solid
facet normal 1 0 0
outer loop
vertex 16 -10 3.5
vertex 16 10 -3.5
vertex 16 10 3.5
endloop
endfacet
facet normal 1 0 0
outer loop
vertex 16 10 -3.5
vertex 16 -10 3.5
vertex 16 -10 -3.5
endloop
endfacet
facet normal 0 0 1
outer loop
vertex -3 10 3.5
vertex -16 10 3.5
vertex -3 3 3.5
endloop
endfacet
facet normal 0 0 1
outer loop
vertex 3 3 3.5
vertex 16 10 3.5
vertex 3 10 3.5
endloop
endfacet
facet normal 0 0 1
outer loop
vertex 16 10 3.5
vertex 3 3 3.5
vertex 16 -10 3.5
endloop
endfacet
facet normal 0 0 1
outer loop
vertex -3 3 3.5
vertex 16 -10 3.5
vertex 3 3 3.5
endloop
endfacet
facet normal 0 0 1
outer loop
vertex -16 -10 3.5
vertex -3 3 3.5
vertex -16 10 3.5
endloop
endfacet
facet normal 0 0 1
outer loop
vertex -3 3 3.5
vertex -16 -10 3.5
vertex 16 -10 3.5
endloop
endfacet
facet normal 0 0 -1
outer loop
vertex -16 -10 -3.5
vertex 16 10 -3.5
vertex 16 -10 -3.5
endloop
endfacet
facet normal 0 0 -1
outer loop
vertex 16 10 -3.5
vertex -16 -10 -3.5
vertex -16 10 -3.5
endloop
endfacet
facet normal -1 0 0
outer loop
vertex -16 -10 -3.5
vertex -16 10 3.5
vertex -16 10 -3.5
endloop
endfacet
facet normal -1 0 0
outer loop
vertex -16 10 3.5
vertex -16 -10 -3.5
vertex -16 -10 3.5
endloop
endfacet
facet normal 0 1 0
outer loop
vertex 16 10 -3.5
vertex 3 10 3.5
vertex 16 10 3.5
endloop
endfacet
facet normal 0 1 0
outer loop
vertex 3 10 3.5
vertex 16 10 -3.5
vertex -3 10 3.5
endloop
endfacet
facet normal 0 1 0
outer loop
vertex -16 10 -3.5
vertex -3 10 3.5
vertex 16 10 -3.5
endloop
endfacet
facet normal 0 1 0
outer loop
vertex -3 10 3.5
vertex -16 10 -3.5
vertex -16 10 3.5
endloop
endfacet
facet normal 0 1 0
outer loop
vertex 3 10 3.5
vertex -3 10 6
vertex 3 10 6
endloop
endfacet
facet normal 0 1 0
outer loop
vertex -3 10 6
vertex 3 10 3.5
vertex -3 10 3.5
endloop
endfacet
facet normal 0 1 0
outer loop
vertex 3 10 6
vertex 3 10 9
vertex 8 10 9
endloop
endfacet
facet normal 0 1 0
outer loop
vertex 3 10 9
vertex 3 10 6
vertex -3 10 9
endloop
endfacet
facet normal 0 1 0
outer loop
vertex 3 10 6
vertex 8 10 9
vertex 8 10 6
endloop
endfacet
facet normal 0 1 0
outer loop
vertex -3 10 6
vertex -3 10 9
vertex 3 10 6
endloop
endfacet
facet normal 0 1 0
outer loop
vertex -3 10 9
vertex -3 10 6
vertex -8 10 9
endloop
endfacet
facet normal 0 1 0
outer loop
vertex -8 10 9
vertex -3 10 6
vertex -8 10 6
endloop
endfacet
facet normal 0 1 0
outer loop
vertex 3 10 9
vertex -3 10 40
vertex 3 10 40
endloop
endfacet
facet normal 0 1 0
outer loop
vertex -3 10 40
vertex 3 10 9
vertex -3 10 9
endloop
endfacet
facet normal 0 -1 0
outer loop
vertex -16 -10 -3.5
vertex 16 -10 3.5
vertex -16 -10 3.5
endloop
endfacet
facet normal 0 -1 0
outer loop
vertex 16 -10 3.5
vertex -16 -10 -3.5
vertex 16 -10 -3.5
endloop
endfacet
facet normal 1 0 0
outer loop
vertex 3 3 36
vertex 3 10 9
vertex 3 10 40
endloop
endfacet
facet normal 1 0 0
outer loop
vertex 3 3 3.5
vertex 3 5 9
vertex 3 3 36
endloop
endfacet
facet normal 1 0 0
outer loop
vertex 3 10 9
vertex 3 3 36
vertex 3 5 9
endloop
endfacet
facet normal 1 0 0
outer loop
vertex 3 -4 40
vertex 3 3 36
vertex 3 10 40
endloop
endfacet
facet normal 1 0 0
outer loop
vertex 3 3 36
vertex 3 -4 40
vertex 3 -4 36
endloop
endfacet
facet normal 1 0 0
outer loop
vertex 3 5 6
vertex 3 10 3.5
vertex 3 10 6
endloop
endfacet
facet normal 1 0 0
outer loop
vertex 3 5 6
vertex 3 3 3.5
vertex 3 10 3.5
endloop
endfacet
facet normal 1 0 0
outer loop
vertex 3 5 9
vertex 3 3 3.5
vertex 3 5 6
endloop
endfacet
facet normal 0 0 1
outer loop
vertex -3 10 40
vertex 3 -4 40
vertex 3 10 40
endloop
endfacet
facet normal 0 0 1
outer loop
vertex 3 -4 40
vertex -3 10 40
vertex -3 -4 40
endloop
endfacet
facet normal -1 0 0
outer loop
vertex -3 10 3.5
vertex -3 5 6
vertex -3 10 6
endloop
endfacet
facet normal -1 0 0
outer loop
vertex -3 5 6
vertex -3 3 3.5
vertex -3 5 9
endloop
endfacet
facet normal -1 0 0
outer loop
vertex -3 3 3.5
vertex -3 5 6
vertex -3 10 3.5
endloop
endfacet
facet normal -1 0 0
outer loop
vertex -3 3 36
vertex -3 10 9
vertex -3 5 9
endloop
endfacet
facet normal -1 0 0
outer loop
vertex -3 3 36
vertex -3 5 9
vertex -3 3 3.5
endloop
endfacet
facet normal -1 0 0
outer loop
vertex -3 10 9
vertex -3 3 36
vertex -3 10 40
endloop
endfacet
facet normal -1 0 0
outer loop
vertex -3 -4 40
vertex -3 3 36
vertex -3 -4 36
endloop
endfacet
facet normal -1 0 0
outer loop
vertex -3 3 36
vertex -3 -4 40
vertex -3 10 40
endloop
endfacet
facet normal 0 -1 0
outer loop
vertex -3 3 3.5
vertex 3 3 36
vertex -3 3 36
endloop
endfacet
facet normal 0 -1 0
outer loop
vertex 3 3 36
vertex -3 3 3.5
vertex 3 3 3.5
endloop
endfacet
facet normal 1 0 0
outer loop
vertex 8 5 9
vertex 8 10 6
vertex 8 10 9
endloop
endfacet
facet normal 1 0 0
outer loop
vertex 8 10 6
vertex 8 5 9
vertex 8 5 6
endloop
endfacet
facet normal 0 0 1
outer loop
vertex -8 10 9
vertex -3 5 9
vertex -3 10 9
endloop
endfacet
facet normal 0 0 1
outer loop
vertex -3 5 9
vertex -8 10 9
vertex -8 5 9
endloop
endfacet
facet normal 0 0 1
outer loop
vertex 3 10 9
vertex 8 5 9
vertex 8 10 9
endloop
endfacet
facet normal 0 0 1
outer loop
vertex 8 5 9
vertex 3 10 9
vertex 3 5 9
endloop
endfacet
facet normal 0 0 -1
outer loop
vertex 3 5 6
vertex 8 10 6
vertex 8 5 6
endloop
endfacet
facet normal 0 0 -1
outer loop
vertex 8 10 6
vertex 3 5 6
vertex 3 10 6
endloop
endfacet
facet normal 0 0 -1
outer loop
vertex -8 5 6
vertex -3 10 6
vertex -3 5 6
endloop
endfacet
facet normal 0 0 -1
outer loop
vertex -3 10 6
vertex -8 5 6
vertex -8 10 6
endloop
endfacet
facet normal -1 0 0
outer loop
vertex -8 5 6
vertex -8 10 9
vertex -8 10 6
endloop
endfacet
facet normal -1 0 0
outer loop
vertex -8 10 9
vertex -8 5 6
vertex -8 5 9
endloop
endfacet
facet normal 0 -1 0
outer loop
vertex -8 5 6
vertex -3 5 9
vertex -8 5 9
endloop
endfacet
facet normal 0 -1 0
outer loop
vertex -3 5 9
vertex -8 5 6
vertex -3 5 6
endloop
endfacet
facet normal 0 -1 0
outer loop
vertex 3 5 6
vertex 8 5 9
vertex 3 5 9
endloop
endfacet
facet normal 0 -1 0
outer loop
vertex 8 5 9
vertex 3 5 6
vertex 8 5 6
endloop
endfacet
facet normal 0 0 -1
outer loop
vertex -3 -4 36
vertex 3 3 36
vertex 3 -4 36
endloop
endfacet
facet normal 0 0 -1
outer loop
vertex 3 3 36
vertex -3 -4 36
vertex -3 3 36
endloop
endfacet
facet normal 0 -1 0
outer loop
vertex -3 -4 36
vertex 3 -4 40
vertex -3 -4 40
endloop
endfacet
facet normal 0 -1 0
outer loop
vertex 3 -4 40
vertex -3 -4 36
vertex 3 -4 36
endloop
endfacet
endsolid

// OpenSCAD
cube([32,20,7],center=true);
translate([0,6.5,20]){cube([6,7,40],center=true);};

translate([0,7.5,7.5]){cube([16,5,3],center=true);};
translate([0,0,38]){cube([6,8,4],center=true);};
